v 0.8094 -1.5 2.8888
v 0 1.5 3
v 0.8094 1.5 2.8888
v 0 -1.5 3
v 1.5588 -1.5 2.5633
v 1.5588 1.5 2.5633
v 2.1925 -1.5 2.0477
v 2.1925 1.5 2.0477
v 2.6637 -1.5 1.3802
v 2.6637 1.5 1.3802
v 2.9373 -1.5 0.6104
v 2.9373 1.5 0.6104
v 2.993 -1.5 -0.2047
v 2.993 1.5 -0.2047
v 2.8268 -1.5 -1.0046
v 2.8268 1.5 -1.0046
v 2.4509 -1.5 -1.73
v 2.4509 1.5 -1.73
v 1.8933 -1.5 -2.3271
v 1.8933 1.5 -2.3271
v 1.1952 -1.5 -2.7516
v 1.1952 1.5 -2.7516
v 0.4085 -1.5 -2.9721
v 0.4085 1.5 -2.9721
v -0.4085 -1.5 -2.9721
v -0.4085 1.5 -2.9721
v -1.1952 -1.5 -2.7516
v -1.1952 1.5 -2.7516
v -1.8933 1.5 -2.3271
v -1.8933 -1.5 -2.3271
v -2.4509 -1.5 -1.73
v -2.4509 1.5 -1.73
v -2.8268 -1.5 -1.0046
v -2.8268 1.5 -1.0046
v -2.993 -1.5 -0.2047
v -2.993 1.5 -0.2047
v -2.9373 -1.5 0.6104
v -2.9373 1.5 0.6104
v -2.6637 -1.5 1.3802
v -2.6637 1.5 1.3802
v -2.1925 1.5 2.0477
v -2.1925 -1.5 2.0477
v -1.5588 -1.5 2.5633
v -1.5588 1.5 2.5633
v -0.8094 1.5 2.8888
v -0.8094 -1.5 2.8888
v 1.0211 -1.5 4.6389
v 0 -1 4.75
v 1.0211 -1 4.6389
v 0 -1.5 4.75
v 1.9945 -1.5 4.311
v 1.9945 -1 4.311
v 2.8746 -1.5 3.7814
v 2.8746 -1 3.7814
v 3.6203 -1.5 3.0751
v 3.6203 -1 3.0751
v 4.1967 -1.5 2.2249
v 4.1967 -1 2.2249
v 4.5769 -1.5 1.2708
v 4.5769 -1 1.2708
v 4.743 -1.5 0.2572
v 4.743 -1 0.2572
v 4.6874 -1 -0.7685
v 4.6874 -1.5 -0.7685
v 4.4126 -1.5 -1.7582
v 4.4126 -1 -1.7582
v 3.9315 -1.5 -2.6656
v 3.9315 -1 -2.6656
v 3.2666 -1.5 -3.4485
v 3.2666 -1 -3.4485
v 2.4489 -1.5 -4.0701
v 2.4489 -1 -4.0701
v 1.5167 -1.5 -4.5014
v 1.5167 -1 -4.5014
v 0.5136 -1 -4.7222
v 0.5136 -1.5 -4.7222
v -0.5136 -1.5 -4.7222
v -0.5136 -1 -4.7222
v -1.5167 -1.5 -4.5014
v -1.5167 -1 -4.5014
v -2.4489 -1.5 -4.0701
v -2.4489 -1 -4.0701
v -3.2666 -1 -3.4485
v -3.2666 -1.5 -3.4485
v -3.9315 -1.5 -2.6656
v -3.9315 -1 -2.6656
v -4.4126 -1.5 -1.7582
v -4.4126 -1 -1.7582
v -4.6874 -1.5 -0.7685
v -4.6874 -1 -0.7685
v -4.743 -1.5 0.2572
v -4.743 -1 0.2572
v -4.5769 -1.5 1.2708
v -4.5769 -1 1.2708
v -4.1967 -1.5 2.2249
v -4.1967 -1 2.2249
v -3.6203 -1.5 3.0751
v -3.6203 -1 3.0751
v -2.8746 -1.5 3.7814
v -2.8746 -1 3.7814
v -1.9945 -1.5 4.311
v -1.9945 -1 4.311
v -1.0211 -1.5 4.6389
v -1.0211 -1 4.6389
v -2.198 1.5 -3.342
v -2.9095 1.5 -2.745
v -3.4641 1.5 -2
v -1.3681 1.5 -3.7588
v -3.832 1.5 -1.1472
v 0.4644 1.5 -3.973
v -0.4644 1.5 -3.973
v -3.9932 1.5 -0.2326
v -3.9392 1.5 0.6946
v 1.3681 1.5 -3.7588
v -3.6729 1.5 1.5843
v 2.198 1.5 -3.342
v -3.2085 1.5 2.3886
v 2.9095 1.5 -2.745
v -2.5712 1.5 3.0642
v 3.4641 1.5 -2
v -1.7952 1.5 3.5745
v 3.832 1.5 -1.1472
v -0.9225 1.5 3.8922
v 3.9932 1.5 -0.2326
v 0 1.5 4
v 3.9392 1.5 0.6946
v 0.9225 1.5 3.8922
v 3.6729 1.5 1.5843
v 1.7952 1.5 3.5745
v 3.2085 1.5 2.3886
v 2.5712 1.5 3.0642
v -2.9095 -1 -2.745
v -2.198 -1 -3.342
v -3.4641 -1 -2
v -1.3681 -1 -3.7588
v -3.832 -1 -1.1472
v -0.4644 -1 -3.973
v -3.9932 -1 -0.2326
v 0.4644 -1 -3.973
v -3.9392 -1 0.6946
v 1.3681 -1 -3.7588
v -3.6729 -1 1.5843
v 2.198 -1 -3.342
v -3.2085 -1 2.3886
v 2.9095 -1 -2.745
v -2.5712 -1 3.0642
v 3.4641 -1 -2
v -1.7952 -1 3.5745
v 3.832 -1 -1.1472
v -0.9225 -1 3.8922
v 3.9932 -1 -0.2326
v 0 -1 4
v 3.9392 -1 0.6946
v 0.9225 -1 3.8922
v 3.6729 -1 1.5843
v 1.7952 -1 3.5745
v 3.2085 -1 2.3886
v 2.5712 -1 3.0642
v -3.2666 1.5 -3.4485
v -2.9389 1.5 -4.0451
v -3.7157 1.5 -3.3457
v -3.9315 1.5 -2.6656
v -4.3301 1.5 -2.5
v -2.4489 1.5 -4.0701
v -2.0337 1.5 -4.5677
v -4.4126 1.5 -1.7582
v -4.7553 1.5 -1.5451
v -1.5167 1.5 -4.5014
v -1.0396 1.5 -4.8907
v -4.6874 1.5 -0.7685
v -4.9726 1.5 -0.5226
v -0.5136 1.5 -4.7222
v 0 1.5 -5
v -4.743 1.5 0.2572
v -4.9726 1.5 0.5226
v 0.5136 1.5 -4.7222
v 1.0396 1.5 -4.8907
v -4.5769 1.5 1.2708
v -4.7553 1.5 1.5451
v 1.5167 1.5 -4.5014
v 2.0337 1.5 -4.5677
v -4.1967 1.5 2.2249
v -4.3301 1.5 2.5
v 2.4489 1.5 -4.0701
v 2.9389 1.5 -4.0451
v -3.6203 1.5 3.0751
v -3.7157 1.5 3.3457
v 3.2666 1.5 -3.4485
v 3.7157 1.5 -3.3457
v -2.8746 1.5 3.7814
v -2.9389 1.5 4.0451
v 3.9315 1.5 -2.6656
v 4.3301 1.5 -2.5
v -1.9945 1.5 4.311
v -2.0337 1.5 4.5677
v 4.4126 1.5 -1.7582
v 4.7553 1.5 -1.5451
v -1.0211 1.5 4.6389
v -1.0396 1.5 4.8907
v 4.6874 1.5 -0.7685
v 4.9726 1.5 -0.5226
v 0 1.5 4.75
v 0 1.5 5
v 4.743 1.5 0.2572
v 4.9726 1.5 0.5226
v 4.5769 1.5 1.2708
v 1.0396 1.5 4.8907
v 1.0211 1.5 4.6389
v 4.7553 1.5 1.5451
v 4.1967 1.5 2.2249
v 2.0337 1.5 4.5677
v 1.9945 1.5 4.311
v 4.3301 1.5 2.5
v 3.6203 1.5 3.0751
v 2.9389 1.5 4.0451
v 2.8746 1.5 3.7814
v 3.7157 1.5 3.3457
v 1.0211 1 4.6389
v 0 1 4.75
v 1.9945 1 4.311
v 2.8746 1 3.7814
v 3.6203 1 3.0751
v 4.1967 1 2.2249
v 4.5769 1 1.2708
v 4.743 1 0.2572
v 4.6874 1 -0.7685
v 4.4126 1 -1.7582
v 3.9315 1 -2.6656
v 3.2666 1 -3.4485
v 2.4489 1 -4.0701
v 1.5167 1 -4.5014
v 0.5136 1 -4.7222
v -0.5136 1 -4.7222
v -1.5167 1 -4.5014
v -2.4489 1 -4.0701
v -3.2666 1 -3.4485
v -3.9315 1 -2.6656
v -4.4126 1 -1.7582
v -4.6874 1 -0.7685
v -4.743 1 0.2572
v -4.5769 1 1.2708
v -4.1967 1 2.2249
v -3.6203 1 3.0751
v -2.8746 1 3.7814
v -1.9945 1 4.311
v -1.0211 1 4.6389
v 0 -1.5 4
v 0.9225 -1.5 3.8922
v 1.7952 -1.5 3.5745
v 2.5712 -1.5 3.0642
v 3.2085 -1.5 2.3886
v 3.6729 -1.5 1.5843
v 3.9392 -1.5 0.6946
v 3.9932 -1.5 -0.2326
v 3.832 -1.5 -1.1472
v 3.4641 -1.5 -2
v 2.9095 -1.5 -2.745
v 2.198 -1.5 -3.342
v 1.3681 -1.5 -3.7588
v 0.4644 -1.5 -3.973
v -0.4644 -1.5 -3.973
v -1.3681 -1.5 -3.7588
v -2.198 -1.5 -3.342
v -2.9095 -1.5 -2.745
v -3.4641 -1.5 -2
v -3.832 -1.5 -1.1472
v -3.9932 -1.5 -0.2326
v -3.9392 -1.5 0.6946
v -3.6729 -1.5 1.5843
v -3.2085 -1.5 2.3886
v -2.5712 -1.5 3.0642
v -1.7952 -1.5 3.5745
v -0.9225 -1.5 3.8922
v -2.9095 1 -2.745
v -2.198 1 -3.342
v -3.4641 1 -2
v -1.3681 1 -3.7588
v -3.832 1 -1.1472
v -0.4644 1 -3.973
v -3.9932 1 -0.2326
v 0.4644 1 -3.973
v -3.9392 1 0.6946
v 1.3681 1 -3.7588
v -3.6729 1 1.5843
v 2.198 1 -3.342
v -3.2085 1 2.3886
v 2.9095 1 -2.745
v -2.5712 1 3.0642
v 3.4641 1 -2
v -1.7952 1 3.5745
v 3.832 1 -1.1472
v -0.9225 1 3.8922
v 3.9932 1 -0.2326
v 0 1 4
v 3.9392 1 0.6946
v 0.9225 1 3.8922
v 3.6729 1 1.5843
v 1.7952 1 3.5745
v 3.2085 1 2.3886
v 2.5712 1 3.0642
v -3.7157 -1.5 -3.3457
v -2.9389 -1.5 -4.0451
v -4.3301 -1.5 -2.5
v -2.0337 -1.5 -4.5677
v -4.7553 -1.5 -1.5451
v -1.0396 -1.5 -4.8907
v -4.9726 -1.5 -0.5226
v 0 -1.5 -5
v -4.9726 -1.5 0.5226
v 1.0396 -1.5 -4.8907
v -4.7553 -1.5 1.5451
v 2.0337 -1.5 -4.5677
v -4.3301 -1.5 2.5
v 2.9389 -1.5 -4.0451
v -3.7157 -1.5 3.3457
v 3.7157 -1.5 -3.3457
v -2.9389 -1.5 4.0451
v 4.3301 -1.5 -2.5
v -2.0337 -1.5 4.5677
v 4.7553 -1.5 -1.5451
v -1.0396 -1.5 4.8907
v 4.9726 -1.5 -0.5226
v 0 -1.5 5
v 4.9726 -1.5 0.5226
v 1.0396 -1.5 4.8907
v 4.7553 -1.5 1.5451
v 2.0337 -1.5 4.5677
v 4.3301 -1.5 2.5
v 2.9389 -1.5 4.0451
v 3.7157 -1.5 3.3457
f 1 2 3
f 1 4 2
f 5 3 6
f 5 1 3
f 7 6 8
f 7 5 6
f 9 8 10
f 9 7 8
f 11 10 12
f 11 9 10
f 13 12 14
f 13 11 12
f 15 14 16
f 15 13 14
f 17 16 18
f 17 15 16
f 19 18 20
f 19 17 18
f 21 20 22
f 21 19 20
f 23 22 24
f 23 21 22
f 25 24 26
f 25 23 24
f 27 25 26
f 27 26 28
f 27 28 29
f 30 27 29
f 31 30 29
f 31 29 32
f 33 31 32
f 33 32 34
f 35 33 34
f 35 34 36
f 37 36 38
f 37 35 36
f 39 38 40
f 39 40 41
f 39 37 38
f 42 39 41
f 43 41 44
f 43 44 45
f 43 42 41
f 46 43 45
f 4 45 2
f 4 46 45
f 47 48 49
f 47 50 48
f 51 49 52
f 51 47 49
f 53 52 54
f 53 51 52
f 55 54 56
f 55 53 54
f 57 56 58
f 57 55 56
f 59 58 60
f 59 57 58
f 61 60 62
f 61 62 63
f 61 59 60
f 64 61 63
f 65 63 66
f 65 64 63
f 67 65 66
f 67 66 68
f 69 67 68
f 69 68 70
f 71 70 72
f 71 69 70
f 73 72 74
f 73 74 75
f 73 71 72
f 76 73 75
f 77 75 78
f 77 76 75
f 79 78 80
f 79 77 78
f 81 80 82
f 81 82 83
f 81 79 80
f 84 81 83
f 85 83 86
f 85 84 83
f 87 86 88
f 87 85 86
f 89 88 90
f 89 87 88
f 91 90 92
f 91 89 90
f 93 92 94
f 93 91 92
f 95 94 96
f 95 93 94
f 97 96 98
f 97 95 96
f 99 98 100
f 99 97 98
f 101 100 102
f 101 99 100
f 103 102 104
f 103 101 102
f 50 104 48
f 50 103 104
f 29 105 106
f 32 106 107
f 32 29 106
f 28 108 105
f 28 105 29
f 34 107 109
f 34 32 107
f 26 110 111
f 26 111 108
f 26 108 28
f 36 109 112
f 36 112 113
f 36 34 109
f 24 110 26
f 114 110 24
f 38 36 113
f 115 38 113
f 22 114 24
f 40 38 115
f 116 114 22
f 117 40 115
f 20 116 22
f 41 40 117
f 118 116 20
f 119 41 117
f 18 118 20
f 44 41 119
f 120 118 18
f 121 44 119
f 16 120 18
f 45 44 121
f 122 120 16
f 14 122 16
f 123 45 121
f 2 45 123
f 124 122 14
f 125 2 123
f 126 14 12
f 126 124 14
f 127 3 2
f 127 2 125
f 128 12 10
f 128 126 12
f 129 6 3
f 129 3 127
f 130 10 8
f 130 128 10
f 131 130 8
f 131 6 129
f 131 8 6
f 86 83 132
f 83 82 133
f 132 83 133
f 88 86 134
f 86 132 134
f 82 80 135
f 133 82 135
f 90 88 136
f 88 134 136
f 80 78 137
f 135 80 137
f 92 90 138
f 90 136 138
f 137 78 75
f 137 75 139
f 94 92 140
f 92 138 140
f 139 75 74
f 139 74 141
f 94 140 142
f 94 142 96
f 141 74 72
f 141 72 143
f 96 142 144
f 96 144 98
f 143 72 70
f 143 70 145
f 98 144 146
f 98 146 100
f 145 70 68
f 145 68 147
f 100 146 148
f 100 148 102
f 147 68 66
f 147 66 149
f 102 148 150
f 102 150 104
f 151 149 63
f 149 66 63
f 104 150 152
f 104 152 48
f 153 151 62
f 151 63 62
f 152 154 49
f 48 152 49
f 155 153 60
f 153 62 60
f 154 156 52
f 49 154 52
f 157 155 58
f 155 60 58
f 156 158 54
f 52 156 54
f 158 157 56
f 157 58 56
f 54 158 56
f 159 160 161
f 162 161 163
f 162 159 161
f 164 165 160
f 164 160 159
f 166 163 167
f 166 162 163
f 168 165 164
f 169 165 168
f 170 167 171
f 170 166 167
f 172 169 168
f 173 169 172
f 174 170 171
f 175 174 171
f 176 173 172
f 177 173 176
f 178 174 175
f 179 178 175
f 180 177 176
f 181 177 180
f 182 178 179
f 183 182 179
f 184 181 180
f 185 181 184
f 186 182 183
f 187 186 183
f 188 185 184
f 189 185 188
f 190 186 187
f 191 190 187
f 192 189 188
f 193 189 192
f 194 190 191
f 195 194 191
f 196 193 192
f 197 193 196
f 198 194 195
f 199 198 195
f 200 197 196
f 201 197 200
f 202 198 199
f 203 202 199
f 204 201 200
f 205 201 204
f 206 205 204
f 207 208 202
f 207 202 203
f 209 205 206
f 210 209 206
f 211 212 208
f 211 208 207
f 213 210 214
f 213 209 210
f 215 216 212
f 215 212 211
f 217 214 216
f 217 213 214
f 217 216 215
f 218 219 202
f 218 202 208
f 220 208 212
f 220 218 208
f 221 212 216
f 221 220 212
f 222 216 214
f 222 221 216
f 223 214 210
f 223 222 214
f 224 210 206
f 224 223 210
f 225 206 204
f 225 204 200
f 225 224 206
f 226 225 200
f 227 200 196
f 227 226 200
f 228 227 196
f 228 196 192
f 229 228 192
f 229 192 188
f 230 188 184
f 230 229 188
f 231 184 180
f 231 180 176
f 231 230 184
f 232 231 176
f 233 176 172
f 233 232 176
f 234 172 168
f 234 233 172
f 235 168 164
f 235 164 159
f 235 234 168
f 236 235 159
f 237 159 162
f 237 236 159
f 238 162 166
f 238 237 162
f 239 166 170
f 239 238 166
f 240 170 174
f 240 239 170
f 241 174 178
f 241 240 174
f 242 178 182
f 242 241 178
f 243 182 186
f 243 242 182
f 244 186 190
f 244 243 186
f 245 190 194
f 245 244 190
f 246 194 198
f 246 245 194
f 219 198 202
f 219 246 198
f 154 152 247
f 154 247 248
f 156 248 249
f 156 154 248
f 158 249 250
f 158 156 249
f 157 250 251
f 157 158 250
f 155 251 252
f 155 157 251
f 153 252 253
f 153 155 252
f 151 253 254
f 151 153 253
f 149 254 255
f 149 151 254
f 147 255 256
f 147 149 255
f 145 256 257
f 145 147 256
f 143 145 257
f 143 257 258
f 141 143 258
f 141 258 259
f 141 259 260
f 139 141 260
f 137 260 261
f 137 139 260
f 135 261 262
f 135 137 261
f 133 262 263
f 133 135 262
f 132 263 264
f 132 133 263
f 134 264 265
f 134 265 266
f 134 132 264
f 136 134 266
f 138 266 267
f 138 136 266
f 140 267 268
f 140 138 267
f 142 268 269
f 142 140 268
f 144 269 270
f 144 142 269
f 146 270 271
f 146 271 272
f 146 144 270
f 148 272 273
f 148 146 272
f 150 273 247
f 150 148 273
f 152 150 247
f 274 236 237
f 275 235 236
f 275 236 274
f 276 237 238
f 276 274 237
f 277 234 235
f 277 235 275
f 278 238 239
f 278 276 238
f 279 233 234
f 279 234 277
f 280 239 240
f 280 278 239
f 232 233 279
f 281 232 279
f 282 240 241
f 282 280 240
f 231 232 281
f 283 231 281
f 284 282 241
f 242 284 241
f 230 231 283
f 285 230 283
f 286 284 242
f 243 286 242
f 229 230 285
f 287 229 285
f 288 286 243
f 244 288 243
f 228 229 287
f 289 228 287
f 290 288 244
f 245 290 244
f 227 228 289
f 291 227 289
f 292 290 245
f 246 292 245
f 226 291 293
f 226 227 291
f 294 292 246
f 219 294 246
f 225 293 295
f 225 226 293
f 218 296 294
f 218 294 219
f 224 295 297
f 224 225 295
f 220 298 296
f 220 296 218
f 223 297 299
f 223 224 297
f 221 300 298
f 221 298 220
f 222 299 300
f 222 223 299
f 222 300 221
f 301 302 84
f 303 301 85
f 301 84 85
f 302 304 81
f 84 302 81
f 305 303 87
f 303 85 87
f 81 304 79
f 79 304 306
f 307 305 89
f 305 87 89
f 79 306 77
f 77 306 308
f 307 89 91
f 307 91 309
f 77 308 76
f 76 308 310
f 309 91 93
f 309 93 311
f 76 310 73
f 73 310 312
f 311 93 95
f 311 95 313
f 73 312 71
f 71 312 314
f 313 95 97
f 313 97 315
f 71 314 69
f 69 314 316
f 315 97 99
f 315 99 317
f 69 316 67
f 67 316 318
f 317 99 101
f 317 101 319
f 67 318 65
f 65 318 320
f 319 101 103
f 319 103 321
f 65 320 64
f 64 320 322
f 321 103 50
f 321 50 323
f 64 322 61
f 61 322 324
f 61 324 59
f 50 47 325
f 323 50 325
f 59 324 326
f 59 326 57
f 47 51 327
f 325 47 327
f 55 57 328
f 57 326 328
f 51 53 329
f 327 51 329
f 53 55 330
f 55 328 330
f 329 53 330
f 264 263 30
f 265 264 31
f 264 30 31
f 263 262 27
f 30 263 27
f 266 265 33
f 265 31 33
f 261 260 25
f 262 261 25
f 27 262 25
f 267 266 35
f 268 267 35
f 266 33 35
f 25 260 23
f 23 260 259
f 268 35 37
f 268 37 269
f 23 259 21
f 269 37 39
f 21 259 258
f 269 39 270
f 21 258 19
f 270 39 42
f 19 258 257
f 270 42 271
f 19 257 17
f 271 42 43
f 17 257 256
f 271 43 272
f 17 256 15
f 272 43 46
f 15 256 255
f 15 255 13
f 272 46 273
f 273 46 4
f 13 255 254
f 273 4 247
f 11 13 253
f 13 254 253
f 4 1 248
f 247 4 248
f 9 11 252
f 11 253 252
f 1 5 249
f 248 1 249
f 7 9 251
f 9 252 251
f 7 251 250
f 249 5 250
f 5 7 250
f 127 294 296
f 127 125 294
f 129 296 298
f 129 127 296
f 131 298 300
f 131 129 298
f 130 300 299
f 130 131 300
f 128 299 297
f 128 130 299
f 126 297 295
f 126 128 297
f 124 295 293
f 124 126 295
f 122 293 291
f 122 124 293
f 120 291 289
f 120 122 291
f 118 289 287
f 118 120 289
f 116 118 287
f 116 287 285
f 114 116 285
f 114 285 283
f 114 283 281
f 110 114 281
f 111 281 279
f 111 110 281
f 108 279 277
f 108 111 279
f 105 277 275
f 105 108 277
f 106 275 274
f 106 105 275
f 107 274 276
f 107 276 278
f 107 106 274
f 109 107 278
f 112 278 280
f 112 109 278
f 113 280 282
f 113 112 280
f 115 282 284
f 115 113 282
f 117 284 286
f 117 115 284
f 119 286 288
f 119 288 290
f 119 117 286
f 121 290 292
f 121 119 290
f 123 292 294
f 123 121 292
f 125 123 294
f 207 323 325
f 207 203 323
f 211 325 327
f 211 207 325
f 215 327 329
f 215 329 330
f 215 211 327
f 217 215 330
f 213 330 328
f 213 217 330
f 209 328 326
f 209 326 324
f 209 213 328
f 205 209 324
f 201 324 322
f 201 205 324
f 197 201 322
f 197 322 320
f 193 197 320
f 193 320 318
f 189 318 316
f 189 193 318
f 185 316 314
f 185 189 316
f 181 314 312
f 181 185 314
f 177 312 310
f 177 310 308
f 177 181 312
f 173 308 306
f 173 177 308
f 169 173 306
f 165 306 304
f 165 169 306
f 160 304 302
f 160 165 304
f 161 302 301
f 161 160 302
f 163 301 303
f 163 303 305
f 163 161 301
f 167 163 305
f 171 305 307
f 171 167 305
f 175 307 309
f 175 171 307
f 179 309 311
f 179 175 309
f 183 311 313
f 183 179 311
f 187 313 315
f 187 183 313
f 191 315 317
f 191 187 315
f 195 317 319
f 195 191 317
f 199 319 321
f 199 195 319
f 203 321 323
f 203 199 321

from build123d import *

# Parameters (mm, degrees)
SKETCH_1_R        = 5
SKETCH_1_R_2      = 4.75
EXTRUDE_1_DEPTH   = 1.5
SKETCH_1_R_3      = 4
SKETCH_1_R_4      = 3
EXTRUDE_1_2_DEPTH = 1.5
SKETCH_1_3_R      = 4.75
SKETCH_1_3_R_2    = 4
EXTRUDE_2_DEPTH   = 1


with BuildPart() as part:
    # 草图1 → 凸台-拉伸1 (new, symmetric)
    with BuildSketch(Plane(origin=(0, 0, 0), x_dir=(1, 0, 0), z_dir=(0, 1, 0))):
        Circle(SKETCH_1_R)
        Circle(SKETCH_1_R_2, mode=Mode.SUBTRACT)
    extrude(amount=EXTRUDE_1_DEPTH, both=True)



with BuildPart() as body_2:
    # 草图1 → Extrude 1 2 (new, symmetric)
    with BuildSketch(Plane(origin=(0, 0, 0), x_dir=(1, 0, 0), z_dir=(0, 1, 0))):
        Circle(SKETCH_1_R_3)
        Circle(SKETCH_1_R_4, mode=Mode.SUBTRACT)
    extrude(amount=EXTRUDE_1_2_DEPTH, both=True)


with BuildPart() as part_1:
    add(part.part)

    add(body_2.part)  # 凸台-拉伸2 merges body 2
    # 草图1<3> → 凸台-拉伸2 (add, symmetric)
    with BuildSketch(Plane(origin=(0, 0, 0), x_dir=(1, 0, 0), z_dir=(0, 1, 0))):
        Circle(SKETCH_1_3_R)
        Circle(SKETCH_1_3_R_2, mode=Mode.SUBTRACT)
    extrude(amount=EXTRUDE_2_DEPTH, both=True)


solid = part_1.part
